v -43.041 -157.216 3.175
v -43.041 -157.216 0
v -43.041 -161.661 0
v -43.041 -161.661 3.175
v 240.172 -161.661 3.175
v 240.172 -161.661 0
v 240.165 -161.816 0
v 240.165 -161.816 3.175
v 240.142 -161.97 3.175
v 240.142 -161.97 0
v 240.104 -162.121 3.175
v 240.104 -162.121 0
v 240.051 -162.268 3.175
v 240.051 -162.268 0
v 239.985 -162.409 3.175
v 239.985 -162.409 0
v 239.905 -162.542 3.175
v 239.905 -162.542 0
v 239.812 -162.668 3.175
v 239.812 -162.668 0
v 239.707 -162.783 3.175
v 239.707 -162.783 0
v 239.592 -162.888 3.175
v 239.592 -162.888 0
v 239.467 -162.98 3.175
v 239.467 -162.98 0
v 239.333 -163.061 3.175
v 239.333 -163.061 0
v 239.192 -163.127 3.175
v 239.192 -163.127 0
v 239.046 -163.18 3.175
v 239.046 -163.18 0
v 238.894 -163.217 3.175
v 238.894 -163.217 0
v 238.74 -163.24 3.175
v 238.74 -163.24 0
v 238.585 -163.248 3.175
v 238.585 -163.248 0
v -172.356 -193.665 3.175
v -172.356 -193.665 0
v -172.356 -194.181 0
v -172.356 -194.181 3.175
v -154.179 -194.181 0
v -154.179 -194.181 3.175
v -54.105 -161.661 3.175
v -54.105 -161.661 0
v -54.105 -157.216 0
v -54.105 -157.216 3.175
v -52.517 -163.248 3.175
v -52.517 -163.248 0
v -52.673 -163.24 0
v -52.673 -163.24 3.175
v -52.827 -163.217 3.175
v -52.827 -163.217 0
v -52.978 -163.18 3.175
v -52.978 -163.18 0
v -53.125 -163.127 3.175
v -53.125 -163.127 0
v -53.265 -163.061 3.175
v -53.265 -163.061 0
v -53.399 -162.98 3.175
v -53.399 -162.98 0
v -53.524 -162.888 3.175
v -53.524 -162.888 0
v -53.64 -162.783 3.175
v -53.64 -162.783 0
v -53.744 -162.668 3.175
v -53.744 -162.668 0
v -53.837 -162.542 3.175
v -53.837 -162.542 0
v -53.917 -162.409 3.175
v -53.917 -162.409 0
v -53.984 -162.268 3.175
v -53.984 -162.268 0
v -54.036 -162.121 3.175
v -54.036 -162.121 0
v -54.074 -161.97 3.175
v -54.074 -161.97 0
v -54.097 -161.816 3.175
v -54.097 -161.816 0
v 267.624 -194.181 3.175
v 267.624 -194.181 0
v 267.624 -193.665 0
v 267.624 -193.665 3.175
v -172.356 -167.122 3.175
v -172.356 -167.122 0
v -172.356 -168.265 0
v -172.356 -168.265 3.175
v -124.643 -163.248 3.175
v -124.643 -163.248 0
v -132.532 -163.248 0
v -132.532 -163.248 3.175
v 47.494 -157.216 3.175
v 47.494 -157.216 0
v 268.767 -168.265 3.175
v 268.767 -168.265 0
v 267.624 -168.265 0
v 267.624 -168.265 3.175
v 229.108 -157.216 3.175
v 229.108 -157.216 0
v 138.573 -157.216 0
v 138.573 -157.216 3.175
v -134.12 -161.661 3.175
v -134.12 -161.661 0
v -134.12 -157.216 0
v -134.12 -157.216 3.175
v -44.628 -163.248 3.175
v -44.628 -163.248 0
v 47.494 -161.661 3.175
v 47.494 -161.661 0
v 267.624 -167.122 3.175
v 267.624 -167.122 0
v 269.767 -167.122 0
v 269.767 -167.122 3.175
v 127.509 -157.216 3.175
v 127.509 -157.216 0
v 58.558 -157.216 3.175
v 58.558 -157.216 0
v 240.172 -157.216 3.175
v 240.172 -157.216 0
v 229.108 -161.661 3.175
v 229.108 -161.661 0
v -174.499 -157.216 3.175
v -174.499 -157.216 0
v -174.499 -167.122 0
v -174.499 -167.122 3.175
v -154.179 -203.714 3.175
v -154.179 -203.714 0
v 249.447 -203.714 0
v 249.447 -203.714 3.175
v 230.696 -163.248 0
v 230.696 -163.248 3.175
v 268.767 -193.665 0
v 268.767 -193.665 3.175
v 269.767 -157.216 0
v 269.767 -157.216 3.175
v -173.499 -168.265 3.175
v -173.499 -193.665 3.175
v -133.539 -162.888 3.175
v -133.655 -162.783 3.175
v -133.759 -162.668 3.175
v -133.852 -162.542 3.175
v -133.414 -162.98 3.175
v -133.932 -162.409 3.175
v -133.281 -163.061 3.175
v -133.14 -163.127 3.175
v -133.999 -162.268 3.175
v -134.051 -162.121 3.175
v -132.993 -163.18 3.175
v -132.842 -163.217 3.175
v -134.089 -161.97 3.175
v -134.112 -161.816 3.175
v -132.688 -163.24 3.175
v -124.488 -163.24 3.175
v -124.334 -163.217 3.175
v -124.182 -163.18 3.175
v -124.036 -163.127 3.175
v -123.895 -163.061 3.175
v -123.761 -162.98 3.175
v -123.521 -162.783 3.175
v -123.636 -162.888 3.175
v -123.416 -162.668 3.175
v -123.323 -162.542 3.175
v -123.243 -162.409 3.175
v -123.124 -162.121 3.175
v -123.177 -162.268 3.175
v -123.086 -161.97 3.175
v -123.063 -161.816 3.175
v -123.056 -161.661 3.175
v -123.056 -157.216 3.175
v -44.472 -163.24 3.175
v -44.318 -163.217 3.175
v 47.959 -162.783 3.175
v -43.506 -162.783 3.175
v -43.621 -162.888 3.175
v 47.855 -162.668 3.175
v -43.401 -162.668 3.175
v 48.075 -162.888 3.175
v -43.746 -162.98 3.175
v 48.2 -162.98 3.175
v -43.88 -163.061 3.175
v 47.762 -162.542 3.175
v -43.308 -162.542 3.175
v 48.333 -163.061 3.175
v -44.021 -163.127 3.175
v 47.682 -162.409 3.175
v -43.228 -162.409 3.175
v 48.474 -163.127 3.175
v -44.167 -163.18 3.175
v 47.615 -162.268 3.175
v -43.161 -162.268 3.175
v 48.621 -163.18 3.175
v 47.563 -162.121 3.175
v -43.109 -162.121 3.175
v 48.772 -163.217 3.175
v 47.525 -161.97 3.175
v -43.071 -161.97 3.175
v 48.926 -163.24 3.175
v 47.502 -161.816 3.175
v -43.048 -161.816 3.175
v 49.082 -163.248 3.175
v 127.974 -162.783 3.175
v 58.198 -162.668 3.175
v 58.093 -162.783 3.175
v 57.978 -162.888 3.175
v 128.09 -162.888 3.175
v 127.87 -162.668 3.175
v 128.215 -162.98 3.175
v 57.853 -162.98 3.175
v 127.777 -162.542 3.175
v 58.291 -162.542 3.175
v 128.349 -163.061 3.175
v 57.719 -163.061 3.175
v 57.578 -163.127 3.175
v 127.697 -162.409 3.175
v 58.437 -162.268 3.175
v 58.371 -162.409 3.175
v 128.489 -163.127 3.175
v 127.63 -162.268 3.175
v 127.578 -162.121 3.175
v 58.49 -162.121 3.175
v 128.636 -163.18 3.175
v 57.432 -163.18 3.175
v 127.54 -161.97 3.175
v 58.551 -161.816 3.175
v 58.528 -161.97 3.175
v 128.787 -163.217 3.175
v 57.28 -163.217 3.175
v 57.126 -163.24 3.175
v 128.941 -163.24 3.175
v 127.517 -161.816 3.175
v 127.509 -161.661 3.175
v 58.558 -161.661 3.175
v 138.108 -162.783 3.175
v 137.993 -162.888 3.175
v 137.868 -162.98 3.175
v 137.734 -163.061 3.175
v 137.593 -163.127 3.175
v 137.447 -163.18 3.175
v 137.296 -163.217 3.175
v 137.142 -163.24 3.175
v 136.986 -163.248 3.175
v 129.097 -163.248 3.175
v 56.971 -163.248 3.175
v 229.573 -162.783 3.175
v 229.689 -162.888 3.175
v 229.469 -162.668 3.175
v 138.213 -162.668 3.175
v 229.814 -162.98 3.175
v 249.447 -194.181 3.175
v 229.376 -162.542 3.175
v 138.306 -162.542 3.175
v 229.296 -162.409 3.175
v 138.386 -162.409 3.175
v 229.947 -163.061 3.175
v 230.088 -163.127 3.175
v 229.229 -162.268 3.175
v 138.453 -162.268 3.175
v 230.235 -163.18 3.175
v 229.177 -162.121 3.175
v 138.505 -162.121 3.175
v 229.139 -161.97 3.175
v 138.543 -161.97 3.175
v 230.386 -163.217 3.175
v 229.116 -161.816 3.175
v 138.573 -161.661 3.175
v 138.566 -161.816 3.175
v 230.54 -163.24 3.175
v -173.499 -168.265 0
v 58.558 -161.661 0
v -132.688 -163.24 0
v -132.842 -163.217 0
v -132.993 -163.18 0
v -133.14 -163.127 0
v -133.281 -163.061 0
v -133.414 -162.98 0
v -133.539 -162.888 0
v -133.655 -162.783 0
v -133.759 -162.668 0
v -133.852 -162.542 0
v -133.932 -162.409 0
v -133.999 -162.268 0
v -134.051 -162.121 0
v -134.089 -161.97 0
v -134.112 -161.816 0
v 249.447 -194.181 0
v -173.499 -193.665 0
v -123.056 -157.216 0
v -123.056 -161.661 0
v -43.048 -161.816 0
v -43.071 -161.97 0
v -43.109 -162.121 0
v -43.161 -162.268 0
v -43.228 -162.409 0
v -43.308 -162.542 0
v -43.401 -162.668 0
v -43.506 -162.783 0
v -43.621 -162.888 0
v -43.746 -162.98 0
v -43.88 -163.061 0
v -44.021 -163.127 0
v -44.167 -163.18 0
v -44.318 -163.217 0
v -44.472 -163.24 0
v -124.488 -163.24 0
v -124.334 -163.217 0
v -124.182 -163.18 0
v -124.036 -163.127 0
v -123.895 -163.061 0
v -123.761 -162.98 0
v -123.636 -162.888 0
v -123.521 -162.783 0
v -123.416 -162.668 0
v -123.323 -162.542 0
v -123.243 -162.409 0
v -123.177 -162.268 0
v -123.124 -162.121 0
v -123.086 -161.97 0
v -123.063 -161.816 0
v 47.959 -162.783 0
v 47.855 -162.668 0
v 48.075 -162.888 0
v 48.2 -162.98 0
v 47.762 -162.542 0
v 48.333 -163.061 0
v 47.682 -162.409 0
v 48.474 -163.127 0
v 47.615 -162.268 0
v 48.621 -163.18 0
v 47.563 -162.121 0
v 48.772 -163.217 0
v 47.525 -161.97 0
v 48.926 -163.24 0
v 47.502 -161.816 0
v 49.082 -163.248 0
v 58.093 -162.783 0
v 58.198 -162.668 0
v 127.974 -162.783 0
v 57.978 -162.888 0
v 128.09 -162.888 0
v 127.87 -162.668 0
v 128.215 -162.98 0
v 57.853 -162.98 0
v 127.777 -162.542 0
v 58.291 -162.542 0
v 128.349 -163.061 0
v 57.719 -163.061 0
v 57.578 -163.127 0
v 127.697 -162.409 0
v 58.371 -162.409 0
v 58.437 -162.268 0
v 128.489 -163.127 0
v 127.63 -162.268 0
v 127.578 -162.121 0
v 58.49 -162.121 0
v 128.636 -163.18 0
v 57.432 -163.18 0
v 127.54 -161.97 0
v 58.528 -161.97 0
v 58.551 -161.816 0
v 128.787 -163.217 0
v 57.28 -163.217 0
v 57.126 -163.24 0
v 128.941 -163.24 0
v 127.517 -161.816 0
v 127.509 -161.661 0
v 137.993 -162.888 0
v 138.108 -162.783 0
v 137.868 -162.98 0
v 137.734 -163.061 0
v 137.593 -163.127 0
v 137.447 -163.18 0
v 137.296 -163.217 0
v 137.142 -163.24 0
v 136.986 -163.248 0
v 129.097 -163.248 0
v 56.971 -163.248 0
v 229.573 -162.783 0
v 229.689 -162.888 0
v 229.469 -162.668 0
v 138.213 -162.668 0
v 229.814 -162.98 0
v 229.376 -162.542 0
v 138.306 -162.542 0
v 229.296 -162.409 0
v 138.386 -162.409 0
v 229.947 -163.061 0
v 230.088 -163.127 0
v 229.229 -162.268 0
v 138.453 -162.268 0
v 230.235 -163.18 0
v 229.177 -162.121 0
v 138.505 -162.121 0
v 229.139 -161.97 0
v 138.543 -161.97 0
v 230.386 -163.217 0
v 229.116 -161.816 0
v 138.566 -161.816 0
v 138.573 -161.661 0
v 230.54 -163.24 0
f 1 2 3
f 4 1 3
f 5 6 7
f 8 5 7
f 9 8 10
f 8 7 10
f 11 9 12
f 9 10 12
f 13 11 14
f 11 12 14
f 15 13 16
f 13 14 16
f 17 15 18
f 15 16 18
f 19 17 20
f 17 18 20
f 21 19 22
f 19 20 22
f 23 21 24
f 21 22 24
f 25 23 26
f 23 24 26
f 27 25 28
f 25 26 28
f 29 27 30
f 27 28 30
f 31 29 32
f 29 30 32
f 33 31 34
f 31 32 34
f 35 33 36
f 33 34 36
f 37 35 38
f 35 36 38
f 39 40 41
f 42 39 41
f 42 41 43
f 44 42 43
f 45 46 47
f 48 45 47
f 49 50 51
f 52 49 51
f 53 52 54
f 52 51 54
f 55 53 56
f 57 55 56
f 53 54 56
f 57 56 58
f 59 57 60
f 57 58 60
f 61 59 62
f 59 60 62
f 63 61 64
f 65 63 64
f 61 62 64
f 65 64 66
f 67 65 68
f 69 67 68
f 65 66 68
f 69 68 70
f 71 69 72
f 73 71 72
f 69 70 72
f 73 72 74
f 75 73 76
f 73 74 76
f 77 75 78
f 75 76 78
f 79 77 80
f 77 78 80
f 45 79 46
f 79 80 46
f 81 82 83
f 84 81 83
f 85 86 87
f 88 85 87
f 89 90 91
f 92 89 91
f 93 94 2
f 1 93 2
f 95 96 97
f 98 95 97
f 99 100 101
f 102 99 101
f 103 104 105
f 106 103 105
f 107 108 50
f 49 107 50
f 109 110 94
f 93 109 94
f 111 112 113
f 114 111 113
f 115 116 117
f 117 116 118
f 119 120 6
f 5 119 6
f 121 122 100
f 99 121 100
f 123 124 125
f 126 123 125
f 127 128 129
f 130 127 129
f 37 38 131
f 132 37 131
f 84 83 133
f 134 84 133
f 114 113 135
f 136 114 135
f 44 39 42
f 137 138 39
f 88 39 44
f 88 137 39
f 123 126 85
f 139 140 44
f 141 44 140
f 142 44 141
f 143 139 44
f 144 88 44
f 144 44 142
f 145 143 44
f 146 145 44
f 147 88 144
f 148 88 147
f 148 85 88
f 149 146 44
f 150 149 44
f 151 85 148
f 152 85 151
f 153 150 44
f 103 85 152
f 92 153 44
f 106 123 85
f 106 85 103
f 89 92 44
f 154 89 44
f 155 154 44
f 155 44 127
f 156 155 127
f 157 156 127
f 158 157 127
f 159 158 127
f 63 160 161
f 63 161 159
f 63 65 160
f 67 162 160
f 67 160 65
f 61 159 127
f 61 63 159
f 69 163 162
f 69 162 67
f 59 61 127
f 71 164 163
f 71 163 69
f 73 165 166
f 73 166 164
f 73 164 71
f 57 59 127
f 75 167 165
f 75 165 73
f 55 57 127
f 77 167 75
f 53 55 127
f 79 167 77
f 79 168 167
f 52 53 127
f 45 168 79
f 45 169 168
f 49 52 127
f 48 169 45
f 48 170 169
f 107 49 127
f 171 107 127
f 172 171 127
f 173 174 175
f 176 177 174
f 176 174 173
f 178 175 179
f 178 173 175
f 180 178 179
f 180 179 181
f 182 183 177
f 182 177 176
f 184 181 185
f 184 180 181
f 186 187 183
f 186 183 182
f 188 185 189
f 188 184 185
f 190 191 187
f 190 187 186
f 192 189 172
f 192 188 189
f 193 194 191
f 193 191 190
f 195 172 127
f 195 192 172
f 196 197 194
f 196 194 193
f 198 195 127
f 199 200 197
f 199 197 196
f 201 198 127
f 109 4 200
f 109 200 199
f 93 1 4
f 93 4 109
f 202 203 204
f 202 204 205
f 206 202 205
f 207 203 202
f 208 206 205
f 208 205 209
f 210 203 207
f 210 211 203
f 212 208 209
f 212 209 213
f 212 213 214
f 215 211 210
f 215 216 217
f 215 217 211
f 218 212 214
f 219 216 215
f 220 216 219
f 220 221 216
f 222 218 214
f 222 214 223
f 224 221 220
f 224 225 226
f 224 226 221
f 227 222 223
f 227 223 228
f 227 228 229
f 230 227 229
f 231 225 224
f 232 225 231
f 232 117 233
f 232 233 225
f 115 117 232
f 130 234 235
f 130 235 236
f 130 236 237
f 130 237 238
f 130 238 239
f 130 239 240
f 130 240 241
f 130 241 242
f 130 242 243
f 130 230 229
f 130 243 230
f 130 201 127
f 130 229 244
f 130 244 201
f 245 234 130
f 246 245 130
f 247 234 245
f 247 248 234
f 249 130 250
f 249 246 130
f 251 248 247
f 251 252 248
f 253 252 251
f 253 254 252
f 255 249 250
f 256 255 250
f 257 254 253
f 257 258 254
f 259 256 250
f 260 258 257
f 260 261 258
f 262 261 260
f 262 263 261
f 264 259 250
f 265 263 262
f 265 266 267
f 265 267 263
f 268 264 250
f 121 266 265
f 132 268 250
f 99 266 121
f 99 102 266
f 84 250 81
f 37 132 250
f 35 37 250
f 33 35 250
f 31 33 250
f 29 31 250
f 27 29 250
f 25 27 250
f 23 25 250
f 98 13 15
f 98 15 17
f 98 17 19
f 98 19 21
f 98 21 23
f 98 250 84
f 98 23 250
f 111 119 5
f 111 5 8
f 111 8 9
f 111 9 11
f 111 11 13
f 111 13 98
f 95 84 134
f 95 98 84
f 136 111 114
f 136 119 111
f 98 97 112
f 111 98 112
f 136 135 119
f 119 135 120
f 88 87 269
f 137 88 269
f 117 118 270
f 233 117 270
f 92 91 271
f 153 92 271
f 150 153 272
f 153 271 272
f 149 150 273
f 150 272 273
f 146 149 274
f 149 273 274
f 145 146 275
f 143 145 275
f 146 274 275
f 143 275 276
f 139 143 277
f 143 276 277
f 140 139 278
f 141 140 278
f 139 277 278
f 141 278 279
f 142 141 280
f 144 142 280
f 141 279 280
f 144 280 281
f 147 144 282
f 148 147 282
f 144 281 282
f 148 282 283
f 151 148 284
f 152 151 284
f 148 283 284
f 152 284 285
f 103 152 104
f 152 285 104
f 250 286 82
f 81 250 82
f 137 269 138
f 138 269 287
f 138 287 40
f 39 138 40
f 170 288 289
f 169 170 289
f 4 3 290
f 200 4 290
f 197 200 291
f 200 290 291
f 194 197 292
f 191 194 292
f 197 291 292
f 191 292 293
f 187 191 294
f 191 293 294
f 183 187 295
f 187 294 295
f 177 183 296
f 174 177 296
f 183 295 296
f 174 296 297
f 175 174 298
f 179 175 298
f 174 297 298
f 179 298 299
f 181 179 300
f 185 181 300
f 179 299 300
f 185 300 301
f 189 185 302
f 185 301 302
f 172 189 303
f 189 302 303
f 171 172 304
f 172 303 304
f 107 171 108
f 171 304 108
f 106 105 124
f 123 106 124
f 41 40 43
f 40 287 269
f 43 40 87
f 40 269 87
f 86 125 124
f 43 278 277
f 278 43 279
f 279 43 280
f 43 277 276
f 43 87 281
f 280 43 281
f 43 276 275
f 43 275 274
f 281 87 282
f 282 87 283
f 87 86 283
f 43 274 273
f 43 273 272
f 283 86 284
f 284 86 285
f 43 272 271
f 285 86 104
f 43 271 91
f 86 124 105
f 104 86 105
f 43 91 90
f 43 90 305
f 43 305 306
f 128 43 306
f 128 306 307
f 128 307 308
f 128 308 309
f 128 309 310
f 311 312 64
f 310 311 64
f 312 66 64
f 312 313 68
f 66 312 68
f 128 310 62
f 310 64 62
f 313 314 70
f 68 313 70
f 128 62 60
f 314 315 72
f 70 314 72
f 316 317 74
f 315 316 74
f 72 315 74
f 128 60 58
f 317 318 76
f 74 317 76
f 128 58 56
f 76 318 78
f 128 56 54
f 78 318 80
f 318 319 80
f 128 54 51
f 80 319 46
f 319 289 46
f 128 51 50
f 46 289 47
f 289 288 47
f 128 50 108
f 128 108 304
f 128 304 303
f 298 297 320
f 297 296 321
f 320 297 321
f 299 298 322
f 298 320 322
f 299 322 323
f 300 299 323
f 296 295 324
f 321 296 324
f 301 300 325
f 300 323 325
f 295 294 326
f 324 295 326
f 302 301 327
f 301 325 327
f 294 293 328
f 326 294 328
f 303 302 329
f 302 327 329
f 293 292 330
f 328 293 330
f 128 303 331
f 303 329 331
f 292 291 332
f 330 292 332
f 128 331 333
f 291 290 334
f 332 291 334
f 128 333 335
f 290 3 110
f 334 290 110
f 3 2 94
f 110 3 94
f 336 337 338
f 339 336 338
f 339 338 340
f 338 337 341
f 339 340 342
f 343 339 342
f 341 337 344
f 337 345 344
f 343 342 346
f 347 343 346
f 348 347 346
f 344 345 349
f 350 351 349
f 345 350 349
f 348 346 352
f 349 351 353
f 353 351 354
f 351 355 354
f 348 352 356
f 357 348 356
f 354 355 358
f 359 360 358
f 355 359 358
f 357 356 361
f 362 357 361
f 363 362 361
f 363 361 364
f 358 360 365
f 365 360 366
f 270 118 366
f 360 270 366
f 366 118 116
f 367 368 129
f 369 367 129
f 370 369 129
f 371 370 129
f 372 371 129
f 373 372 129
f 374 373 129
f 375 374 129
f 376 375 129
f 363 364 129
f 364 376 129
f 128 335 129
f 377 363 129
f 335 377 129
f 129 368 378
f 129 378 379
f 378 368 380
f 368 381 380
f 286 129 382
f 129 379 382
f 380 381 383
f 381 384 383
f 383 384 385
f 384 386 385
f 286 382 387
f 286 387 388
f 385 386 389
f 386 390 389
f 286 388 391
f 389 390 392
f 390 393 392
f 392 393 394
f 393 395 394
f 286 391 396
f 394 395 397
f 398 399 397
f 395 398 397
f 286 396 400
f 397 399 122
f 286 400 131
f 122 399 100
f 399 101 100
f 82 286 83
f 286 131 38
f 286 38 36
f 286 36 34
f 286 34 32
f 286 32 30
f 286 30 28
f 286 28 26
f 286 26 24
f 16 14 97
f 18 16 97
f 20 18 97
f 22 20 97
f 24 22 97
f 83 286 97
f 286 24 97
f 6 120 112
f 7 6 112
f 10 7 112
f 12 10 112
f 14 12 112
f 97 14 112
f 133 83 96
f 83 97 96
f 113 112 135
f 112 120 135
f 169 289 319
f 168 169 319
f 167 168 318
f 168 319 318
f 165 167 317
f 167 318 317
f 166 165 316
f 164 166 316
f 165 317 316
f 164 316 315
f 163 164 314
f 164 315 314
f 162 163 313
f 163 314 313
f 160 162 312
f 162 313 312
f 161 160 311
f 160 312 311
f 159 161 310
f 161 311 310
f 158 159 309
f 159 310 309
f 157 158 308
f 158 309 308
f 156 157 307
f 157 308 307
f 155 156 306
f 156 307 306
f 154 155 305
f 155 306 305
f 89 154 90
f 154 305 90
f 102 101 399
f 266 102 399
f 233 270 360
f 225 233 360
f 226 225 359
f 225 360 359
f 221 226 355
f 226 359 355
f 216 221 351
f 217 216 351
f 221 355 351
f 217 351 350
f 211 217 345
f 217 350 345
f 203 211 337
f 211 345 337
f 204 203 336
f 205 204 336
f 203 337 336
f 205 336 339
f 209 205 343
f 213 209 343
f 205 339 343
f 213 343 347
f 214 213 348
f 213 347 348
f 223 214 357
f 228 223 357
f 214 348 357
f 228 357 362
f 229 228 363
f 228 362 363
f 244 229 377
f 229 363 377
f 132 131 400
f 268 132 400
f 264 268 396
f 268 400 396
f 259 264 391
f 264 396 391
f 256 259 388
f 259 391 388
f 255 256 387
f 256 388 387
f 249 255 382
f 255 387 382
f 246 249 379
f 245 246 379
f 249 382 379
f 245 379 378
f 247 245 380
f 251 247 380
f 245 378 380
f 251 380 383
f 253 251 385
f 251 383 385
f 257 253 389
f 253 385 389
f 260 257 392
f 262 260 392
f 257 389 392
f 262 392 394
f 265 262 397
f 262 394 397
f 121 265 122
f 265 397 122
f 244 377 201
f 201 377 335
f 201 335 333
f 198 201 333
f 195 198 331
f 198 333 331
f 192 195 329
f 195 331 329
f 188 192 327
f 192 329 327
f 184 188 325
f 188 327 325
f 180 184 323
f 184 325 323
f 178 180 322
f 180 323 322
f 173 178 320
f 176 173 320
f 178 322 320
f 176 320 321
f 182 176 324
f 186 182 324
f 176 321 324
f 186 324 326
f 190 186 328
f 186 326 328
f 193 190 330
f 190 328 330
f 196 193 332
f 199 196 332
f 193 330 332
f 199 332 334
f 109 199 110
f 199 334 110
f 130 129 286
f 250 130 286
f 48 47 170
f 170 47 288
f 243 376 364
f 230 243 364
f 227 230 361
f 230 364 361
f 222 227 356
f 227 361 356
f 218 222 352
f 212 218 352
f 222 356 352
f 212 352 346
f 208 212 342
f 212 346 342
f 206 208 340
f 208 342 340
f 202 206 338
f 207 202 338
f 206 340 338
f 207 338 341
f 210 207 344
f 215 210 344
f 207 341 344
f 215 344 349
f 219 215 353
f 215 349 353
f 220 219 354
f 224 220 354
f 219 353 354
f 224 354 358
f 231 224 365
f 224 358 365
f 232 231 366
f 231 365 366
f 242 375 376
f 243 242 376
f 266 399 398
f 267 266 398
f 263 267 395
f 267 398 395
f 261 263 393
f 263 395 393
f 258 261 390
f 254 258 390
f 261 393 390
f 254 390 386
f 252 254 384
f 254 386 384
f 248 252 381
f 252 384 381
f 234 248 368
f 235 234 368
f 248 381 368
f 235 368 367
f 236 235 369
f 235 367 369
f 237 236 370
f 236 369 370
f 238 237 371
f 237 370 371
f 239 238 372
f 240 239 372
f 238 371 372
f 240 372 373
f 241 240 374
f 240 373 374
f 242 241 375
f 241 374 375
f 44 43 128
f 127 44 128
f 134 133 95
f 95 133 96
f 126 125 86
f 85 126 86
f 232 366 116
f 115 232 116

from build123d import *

# Parameters (mm, degrees)
BOSS_EXTRUDE1_DEPTH = 3.175


with BuildPart() as part:
    # Sketch2 → Boss-Extrude1 (new body)
    with BuildSketch(Plane.XY):
        with BuildLine():
            Line((249.446820082, -203.714000022), (249.446820082, -194.181000022))
            Line((249.446820082, -194.181000022), (267.623820082, -194.181000022))
            Line((267.623820082, -194.181000022), (267.623820082, -193.665000022))
            Line((267.623820082, -193.665000022), (268.766820082, -193.665000022))
            Line((268.766820082, -193.665000022), (268.766820082, -168.265000022))
            Line((268.766820082, -168.265000022), (267.623820082, -168.265000022))
            Line((267.623820082, -168.265000022), (267.623820082, -167.122000022))
            Line((267.623820082, -167.122000022), (269.766820082, -167.122000022))
            Line((269.766820082, -167.122000022), (269.766820082, -157.216000022))
            Line((269.766820082, -157.216000022), (240.172195086, -157.216000021))
            Line((240.172195086, -157.216000021), (240.172195086, -161.66050002))
            ThreePointArc((240.172195086, -161.66050002), (239.707227101, -162.783032036), (238.584695086, -163.24800002))
            Line((238.584695086, -163.24800002), (230.695695086, -163.24800002))
            ThreePointArc((230.695695086, -163.24800002), (229.573163071, -162.783032035), (229.108195086, -161.66050002))
            Line((229.108195086, -161.66050002), (229.108195086, -157.216000021))
            Line((229.108195086, -157.216000021), (138.573445094, -157.216000021))
            Line((138.573445094, -157.216000021), (138.573445094, -161.66050002))
            ThreePointArc((138.573445094, -161.66050002), (138.108477109, -162.783032035), (136.985945094, -163.24800002))
            Line((136.985945094, -163.24800002), (129.096945094, -163.24800002))
            ThreePointArc((129.096945094, -163.24800002), (127.974413079, -162.783032035), (127.509445094, -161.66050002))
            Line((127.509445094, -161.66050002), (127.509445094, -157.216000021))
            Line((127.509445094, -157.216000021), (58.558195094, -157.216000021))
            Line((58.558195094, -157.216000021), (58.558195094, -161.66050002))
            ThreePointArc((58.558195094, -161.66050002), (58.093227109, -162.783032035), (56.970695094, -163.24800002))
            Line((56.970695094, -163.24800002), (49.081695094, -163.24800002))
            ThreePointArc((49.081695094, -163.24800002), (47.959163079, -162.783032035), (47.494195094, -161.66050002))
            Line((47.494195094, -161.66050002), (47.494195094, -157.216000021))
            Line((47.494195094, -157.216000021), (-43.040554898, -157.21600002))
            Line((-43.040554898, -157.21600002), (-43.040554898, -161.660500019))
            ThreePointArc((-43.040554898, -161.660500019), (-43.505522883, -162.783032034), (-44.628054898, -163.248000019))
            Line((-44.628054898, -163.248000019), (-52.517054898, -163.248000019))
            ThreePointArc((-52.517054898, -163.248000019), (-53.639586913, -162.783032034), (-54.104554898, -161.660500019))
            Line((-54.104554898, -161.660500019), (-54.104554898, -157.21600002))
            Line((-54.104554898, -157.21600002), (-123.055804898, -157.21600002))
            Line((-123.055804898, -157.21600002), (-123.055804898, -161.660500019))
            ThreePointArc((-123.055804898, -161.660500019), (-123.520772883, -162.783032034), (-124.643304898, -163.248000019))
            Line((-124.643304898, -163.248000019), (-132.532304898, -163.248000019))
            ThreePointArc((-132.532304898, -163.248000019), (-133.654836913, -162.783032034), (-134.119804898, -161.660500019))
            Line((-134.119804898, -161.660500019), (-134.119804898, -157.21600002))
            Line((-134.119804898, -157.21600002), (-174.499179878, -157.21600002))
            Line((-174.499179878, -157.21600002), (-174.499179878, -167.12200002))
            Line((-174.499179878, -167.12200002), (-172.356179878, -167.12200002))
            Line((-172.356179878, -167.12200002), (-172.356179878, -168.26500002))
            Line((-172.356179878, -168.26500002), (-173.499179878, -168.26500002))
            Line((-173.499179878, -168.26500002), (-173.499179878, -193.66500002))
            Line((-173.499179878, -193.66500002), (-172.356179878, -193.66500002))
            Line((-172.356179878, -193.66500002), (-172.356179878, -194.18100002))
            Line((-172.356179878, -194.18100002), (-154.179179878, -194.18100002))
            Line((-154.179179878, -194.18100002), (-154.179179878, -203.71400002))
            Line((-154.179179878, -203.71400002), (249.446820082, -203.714000022))
        make_face()
    extrude(amount=BOSS_EXTRUDE1_DEPTH)


solid = part.part
